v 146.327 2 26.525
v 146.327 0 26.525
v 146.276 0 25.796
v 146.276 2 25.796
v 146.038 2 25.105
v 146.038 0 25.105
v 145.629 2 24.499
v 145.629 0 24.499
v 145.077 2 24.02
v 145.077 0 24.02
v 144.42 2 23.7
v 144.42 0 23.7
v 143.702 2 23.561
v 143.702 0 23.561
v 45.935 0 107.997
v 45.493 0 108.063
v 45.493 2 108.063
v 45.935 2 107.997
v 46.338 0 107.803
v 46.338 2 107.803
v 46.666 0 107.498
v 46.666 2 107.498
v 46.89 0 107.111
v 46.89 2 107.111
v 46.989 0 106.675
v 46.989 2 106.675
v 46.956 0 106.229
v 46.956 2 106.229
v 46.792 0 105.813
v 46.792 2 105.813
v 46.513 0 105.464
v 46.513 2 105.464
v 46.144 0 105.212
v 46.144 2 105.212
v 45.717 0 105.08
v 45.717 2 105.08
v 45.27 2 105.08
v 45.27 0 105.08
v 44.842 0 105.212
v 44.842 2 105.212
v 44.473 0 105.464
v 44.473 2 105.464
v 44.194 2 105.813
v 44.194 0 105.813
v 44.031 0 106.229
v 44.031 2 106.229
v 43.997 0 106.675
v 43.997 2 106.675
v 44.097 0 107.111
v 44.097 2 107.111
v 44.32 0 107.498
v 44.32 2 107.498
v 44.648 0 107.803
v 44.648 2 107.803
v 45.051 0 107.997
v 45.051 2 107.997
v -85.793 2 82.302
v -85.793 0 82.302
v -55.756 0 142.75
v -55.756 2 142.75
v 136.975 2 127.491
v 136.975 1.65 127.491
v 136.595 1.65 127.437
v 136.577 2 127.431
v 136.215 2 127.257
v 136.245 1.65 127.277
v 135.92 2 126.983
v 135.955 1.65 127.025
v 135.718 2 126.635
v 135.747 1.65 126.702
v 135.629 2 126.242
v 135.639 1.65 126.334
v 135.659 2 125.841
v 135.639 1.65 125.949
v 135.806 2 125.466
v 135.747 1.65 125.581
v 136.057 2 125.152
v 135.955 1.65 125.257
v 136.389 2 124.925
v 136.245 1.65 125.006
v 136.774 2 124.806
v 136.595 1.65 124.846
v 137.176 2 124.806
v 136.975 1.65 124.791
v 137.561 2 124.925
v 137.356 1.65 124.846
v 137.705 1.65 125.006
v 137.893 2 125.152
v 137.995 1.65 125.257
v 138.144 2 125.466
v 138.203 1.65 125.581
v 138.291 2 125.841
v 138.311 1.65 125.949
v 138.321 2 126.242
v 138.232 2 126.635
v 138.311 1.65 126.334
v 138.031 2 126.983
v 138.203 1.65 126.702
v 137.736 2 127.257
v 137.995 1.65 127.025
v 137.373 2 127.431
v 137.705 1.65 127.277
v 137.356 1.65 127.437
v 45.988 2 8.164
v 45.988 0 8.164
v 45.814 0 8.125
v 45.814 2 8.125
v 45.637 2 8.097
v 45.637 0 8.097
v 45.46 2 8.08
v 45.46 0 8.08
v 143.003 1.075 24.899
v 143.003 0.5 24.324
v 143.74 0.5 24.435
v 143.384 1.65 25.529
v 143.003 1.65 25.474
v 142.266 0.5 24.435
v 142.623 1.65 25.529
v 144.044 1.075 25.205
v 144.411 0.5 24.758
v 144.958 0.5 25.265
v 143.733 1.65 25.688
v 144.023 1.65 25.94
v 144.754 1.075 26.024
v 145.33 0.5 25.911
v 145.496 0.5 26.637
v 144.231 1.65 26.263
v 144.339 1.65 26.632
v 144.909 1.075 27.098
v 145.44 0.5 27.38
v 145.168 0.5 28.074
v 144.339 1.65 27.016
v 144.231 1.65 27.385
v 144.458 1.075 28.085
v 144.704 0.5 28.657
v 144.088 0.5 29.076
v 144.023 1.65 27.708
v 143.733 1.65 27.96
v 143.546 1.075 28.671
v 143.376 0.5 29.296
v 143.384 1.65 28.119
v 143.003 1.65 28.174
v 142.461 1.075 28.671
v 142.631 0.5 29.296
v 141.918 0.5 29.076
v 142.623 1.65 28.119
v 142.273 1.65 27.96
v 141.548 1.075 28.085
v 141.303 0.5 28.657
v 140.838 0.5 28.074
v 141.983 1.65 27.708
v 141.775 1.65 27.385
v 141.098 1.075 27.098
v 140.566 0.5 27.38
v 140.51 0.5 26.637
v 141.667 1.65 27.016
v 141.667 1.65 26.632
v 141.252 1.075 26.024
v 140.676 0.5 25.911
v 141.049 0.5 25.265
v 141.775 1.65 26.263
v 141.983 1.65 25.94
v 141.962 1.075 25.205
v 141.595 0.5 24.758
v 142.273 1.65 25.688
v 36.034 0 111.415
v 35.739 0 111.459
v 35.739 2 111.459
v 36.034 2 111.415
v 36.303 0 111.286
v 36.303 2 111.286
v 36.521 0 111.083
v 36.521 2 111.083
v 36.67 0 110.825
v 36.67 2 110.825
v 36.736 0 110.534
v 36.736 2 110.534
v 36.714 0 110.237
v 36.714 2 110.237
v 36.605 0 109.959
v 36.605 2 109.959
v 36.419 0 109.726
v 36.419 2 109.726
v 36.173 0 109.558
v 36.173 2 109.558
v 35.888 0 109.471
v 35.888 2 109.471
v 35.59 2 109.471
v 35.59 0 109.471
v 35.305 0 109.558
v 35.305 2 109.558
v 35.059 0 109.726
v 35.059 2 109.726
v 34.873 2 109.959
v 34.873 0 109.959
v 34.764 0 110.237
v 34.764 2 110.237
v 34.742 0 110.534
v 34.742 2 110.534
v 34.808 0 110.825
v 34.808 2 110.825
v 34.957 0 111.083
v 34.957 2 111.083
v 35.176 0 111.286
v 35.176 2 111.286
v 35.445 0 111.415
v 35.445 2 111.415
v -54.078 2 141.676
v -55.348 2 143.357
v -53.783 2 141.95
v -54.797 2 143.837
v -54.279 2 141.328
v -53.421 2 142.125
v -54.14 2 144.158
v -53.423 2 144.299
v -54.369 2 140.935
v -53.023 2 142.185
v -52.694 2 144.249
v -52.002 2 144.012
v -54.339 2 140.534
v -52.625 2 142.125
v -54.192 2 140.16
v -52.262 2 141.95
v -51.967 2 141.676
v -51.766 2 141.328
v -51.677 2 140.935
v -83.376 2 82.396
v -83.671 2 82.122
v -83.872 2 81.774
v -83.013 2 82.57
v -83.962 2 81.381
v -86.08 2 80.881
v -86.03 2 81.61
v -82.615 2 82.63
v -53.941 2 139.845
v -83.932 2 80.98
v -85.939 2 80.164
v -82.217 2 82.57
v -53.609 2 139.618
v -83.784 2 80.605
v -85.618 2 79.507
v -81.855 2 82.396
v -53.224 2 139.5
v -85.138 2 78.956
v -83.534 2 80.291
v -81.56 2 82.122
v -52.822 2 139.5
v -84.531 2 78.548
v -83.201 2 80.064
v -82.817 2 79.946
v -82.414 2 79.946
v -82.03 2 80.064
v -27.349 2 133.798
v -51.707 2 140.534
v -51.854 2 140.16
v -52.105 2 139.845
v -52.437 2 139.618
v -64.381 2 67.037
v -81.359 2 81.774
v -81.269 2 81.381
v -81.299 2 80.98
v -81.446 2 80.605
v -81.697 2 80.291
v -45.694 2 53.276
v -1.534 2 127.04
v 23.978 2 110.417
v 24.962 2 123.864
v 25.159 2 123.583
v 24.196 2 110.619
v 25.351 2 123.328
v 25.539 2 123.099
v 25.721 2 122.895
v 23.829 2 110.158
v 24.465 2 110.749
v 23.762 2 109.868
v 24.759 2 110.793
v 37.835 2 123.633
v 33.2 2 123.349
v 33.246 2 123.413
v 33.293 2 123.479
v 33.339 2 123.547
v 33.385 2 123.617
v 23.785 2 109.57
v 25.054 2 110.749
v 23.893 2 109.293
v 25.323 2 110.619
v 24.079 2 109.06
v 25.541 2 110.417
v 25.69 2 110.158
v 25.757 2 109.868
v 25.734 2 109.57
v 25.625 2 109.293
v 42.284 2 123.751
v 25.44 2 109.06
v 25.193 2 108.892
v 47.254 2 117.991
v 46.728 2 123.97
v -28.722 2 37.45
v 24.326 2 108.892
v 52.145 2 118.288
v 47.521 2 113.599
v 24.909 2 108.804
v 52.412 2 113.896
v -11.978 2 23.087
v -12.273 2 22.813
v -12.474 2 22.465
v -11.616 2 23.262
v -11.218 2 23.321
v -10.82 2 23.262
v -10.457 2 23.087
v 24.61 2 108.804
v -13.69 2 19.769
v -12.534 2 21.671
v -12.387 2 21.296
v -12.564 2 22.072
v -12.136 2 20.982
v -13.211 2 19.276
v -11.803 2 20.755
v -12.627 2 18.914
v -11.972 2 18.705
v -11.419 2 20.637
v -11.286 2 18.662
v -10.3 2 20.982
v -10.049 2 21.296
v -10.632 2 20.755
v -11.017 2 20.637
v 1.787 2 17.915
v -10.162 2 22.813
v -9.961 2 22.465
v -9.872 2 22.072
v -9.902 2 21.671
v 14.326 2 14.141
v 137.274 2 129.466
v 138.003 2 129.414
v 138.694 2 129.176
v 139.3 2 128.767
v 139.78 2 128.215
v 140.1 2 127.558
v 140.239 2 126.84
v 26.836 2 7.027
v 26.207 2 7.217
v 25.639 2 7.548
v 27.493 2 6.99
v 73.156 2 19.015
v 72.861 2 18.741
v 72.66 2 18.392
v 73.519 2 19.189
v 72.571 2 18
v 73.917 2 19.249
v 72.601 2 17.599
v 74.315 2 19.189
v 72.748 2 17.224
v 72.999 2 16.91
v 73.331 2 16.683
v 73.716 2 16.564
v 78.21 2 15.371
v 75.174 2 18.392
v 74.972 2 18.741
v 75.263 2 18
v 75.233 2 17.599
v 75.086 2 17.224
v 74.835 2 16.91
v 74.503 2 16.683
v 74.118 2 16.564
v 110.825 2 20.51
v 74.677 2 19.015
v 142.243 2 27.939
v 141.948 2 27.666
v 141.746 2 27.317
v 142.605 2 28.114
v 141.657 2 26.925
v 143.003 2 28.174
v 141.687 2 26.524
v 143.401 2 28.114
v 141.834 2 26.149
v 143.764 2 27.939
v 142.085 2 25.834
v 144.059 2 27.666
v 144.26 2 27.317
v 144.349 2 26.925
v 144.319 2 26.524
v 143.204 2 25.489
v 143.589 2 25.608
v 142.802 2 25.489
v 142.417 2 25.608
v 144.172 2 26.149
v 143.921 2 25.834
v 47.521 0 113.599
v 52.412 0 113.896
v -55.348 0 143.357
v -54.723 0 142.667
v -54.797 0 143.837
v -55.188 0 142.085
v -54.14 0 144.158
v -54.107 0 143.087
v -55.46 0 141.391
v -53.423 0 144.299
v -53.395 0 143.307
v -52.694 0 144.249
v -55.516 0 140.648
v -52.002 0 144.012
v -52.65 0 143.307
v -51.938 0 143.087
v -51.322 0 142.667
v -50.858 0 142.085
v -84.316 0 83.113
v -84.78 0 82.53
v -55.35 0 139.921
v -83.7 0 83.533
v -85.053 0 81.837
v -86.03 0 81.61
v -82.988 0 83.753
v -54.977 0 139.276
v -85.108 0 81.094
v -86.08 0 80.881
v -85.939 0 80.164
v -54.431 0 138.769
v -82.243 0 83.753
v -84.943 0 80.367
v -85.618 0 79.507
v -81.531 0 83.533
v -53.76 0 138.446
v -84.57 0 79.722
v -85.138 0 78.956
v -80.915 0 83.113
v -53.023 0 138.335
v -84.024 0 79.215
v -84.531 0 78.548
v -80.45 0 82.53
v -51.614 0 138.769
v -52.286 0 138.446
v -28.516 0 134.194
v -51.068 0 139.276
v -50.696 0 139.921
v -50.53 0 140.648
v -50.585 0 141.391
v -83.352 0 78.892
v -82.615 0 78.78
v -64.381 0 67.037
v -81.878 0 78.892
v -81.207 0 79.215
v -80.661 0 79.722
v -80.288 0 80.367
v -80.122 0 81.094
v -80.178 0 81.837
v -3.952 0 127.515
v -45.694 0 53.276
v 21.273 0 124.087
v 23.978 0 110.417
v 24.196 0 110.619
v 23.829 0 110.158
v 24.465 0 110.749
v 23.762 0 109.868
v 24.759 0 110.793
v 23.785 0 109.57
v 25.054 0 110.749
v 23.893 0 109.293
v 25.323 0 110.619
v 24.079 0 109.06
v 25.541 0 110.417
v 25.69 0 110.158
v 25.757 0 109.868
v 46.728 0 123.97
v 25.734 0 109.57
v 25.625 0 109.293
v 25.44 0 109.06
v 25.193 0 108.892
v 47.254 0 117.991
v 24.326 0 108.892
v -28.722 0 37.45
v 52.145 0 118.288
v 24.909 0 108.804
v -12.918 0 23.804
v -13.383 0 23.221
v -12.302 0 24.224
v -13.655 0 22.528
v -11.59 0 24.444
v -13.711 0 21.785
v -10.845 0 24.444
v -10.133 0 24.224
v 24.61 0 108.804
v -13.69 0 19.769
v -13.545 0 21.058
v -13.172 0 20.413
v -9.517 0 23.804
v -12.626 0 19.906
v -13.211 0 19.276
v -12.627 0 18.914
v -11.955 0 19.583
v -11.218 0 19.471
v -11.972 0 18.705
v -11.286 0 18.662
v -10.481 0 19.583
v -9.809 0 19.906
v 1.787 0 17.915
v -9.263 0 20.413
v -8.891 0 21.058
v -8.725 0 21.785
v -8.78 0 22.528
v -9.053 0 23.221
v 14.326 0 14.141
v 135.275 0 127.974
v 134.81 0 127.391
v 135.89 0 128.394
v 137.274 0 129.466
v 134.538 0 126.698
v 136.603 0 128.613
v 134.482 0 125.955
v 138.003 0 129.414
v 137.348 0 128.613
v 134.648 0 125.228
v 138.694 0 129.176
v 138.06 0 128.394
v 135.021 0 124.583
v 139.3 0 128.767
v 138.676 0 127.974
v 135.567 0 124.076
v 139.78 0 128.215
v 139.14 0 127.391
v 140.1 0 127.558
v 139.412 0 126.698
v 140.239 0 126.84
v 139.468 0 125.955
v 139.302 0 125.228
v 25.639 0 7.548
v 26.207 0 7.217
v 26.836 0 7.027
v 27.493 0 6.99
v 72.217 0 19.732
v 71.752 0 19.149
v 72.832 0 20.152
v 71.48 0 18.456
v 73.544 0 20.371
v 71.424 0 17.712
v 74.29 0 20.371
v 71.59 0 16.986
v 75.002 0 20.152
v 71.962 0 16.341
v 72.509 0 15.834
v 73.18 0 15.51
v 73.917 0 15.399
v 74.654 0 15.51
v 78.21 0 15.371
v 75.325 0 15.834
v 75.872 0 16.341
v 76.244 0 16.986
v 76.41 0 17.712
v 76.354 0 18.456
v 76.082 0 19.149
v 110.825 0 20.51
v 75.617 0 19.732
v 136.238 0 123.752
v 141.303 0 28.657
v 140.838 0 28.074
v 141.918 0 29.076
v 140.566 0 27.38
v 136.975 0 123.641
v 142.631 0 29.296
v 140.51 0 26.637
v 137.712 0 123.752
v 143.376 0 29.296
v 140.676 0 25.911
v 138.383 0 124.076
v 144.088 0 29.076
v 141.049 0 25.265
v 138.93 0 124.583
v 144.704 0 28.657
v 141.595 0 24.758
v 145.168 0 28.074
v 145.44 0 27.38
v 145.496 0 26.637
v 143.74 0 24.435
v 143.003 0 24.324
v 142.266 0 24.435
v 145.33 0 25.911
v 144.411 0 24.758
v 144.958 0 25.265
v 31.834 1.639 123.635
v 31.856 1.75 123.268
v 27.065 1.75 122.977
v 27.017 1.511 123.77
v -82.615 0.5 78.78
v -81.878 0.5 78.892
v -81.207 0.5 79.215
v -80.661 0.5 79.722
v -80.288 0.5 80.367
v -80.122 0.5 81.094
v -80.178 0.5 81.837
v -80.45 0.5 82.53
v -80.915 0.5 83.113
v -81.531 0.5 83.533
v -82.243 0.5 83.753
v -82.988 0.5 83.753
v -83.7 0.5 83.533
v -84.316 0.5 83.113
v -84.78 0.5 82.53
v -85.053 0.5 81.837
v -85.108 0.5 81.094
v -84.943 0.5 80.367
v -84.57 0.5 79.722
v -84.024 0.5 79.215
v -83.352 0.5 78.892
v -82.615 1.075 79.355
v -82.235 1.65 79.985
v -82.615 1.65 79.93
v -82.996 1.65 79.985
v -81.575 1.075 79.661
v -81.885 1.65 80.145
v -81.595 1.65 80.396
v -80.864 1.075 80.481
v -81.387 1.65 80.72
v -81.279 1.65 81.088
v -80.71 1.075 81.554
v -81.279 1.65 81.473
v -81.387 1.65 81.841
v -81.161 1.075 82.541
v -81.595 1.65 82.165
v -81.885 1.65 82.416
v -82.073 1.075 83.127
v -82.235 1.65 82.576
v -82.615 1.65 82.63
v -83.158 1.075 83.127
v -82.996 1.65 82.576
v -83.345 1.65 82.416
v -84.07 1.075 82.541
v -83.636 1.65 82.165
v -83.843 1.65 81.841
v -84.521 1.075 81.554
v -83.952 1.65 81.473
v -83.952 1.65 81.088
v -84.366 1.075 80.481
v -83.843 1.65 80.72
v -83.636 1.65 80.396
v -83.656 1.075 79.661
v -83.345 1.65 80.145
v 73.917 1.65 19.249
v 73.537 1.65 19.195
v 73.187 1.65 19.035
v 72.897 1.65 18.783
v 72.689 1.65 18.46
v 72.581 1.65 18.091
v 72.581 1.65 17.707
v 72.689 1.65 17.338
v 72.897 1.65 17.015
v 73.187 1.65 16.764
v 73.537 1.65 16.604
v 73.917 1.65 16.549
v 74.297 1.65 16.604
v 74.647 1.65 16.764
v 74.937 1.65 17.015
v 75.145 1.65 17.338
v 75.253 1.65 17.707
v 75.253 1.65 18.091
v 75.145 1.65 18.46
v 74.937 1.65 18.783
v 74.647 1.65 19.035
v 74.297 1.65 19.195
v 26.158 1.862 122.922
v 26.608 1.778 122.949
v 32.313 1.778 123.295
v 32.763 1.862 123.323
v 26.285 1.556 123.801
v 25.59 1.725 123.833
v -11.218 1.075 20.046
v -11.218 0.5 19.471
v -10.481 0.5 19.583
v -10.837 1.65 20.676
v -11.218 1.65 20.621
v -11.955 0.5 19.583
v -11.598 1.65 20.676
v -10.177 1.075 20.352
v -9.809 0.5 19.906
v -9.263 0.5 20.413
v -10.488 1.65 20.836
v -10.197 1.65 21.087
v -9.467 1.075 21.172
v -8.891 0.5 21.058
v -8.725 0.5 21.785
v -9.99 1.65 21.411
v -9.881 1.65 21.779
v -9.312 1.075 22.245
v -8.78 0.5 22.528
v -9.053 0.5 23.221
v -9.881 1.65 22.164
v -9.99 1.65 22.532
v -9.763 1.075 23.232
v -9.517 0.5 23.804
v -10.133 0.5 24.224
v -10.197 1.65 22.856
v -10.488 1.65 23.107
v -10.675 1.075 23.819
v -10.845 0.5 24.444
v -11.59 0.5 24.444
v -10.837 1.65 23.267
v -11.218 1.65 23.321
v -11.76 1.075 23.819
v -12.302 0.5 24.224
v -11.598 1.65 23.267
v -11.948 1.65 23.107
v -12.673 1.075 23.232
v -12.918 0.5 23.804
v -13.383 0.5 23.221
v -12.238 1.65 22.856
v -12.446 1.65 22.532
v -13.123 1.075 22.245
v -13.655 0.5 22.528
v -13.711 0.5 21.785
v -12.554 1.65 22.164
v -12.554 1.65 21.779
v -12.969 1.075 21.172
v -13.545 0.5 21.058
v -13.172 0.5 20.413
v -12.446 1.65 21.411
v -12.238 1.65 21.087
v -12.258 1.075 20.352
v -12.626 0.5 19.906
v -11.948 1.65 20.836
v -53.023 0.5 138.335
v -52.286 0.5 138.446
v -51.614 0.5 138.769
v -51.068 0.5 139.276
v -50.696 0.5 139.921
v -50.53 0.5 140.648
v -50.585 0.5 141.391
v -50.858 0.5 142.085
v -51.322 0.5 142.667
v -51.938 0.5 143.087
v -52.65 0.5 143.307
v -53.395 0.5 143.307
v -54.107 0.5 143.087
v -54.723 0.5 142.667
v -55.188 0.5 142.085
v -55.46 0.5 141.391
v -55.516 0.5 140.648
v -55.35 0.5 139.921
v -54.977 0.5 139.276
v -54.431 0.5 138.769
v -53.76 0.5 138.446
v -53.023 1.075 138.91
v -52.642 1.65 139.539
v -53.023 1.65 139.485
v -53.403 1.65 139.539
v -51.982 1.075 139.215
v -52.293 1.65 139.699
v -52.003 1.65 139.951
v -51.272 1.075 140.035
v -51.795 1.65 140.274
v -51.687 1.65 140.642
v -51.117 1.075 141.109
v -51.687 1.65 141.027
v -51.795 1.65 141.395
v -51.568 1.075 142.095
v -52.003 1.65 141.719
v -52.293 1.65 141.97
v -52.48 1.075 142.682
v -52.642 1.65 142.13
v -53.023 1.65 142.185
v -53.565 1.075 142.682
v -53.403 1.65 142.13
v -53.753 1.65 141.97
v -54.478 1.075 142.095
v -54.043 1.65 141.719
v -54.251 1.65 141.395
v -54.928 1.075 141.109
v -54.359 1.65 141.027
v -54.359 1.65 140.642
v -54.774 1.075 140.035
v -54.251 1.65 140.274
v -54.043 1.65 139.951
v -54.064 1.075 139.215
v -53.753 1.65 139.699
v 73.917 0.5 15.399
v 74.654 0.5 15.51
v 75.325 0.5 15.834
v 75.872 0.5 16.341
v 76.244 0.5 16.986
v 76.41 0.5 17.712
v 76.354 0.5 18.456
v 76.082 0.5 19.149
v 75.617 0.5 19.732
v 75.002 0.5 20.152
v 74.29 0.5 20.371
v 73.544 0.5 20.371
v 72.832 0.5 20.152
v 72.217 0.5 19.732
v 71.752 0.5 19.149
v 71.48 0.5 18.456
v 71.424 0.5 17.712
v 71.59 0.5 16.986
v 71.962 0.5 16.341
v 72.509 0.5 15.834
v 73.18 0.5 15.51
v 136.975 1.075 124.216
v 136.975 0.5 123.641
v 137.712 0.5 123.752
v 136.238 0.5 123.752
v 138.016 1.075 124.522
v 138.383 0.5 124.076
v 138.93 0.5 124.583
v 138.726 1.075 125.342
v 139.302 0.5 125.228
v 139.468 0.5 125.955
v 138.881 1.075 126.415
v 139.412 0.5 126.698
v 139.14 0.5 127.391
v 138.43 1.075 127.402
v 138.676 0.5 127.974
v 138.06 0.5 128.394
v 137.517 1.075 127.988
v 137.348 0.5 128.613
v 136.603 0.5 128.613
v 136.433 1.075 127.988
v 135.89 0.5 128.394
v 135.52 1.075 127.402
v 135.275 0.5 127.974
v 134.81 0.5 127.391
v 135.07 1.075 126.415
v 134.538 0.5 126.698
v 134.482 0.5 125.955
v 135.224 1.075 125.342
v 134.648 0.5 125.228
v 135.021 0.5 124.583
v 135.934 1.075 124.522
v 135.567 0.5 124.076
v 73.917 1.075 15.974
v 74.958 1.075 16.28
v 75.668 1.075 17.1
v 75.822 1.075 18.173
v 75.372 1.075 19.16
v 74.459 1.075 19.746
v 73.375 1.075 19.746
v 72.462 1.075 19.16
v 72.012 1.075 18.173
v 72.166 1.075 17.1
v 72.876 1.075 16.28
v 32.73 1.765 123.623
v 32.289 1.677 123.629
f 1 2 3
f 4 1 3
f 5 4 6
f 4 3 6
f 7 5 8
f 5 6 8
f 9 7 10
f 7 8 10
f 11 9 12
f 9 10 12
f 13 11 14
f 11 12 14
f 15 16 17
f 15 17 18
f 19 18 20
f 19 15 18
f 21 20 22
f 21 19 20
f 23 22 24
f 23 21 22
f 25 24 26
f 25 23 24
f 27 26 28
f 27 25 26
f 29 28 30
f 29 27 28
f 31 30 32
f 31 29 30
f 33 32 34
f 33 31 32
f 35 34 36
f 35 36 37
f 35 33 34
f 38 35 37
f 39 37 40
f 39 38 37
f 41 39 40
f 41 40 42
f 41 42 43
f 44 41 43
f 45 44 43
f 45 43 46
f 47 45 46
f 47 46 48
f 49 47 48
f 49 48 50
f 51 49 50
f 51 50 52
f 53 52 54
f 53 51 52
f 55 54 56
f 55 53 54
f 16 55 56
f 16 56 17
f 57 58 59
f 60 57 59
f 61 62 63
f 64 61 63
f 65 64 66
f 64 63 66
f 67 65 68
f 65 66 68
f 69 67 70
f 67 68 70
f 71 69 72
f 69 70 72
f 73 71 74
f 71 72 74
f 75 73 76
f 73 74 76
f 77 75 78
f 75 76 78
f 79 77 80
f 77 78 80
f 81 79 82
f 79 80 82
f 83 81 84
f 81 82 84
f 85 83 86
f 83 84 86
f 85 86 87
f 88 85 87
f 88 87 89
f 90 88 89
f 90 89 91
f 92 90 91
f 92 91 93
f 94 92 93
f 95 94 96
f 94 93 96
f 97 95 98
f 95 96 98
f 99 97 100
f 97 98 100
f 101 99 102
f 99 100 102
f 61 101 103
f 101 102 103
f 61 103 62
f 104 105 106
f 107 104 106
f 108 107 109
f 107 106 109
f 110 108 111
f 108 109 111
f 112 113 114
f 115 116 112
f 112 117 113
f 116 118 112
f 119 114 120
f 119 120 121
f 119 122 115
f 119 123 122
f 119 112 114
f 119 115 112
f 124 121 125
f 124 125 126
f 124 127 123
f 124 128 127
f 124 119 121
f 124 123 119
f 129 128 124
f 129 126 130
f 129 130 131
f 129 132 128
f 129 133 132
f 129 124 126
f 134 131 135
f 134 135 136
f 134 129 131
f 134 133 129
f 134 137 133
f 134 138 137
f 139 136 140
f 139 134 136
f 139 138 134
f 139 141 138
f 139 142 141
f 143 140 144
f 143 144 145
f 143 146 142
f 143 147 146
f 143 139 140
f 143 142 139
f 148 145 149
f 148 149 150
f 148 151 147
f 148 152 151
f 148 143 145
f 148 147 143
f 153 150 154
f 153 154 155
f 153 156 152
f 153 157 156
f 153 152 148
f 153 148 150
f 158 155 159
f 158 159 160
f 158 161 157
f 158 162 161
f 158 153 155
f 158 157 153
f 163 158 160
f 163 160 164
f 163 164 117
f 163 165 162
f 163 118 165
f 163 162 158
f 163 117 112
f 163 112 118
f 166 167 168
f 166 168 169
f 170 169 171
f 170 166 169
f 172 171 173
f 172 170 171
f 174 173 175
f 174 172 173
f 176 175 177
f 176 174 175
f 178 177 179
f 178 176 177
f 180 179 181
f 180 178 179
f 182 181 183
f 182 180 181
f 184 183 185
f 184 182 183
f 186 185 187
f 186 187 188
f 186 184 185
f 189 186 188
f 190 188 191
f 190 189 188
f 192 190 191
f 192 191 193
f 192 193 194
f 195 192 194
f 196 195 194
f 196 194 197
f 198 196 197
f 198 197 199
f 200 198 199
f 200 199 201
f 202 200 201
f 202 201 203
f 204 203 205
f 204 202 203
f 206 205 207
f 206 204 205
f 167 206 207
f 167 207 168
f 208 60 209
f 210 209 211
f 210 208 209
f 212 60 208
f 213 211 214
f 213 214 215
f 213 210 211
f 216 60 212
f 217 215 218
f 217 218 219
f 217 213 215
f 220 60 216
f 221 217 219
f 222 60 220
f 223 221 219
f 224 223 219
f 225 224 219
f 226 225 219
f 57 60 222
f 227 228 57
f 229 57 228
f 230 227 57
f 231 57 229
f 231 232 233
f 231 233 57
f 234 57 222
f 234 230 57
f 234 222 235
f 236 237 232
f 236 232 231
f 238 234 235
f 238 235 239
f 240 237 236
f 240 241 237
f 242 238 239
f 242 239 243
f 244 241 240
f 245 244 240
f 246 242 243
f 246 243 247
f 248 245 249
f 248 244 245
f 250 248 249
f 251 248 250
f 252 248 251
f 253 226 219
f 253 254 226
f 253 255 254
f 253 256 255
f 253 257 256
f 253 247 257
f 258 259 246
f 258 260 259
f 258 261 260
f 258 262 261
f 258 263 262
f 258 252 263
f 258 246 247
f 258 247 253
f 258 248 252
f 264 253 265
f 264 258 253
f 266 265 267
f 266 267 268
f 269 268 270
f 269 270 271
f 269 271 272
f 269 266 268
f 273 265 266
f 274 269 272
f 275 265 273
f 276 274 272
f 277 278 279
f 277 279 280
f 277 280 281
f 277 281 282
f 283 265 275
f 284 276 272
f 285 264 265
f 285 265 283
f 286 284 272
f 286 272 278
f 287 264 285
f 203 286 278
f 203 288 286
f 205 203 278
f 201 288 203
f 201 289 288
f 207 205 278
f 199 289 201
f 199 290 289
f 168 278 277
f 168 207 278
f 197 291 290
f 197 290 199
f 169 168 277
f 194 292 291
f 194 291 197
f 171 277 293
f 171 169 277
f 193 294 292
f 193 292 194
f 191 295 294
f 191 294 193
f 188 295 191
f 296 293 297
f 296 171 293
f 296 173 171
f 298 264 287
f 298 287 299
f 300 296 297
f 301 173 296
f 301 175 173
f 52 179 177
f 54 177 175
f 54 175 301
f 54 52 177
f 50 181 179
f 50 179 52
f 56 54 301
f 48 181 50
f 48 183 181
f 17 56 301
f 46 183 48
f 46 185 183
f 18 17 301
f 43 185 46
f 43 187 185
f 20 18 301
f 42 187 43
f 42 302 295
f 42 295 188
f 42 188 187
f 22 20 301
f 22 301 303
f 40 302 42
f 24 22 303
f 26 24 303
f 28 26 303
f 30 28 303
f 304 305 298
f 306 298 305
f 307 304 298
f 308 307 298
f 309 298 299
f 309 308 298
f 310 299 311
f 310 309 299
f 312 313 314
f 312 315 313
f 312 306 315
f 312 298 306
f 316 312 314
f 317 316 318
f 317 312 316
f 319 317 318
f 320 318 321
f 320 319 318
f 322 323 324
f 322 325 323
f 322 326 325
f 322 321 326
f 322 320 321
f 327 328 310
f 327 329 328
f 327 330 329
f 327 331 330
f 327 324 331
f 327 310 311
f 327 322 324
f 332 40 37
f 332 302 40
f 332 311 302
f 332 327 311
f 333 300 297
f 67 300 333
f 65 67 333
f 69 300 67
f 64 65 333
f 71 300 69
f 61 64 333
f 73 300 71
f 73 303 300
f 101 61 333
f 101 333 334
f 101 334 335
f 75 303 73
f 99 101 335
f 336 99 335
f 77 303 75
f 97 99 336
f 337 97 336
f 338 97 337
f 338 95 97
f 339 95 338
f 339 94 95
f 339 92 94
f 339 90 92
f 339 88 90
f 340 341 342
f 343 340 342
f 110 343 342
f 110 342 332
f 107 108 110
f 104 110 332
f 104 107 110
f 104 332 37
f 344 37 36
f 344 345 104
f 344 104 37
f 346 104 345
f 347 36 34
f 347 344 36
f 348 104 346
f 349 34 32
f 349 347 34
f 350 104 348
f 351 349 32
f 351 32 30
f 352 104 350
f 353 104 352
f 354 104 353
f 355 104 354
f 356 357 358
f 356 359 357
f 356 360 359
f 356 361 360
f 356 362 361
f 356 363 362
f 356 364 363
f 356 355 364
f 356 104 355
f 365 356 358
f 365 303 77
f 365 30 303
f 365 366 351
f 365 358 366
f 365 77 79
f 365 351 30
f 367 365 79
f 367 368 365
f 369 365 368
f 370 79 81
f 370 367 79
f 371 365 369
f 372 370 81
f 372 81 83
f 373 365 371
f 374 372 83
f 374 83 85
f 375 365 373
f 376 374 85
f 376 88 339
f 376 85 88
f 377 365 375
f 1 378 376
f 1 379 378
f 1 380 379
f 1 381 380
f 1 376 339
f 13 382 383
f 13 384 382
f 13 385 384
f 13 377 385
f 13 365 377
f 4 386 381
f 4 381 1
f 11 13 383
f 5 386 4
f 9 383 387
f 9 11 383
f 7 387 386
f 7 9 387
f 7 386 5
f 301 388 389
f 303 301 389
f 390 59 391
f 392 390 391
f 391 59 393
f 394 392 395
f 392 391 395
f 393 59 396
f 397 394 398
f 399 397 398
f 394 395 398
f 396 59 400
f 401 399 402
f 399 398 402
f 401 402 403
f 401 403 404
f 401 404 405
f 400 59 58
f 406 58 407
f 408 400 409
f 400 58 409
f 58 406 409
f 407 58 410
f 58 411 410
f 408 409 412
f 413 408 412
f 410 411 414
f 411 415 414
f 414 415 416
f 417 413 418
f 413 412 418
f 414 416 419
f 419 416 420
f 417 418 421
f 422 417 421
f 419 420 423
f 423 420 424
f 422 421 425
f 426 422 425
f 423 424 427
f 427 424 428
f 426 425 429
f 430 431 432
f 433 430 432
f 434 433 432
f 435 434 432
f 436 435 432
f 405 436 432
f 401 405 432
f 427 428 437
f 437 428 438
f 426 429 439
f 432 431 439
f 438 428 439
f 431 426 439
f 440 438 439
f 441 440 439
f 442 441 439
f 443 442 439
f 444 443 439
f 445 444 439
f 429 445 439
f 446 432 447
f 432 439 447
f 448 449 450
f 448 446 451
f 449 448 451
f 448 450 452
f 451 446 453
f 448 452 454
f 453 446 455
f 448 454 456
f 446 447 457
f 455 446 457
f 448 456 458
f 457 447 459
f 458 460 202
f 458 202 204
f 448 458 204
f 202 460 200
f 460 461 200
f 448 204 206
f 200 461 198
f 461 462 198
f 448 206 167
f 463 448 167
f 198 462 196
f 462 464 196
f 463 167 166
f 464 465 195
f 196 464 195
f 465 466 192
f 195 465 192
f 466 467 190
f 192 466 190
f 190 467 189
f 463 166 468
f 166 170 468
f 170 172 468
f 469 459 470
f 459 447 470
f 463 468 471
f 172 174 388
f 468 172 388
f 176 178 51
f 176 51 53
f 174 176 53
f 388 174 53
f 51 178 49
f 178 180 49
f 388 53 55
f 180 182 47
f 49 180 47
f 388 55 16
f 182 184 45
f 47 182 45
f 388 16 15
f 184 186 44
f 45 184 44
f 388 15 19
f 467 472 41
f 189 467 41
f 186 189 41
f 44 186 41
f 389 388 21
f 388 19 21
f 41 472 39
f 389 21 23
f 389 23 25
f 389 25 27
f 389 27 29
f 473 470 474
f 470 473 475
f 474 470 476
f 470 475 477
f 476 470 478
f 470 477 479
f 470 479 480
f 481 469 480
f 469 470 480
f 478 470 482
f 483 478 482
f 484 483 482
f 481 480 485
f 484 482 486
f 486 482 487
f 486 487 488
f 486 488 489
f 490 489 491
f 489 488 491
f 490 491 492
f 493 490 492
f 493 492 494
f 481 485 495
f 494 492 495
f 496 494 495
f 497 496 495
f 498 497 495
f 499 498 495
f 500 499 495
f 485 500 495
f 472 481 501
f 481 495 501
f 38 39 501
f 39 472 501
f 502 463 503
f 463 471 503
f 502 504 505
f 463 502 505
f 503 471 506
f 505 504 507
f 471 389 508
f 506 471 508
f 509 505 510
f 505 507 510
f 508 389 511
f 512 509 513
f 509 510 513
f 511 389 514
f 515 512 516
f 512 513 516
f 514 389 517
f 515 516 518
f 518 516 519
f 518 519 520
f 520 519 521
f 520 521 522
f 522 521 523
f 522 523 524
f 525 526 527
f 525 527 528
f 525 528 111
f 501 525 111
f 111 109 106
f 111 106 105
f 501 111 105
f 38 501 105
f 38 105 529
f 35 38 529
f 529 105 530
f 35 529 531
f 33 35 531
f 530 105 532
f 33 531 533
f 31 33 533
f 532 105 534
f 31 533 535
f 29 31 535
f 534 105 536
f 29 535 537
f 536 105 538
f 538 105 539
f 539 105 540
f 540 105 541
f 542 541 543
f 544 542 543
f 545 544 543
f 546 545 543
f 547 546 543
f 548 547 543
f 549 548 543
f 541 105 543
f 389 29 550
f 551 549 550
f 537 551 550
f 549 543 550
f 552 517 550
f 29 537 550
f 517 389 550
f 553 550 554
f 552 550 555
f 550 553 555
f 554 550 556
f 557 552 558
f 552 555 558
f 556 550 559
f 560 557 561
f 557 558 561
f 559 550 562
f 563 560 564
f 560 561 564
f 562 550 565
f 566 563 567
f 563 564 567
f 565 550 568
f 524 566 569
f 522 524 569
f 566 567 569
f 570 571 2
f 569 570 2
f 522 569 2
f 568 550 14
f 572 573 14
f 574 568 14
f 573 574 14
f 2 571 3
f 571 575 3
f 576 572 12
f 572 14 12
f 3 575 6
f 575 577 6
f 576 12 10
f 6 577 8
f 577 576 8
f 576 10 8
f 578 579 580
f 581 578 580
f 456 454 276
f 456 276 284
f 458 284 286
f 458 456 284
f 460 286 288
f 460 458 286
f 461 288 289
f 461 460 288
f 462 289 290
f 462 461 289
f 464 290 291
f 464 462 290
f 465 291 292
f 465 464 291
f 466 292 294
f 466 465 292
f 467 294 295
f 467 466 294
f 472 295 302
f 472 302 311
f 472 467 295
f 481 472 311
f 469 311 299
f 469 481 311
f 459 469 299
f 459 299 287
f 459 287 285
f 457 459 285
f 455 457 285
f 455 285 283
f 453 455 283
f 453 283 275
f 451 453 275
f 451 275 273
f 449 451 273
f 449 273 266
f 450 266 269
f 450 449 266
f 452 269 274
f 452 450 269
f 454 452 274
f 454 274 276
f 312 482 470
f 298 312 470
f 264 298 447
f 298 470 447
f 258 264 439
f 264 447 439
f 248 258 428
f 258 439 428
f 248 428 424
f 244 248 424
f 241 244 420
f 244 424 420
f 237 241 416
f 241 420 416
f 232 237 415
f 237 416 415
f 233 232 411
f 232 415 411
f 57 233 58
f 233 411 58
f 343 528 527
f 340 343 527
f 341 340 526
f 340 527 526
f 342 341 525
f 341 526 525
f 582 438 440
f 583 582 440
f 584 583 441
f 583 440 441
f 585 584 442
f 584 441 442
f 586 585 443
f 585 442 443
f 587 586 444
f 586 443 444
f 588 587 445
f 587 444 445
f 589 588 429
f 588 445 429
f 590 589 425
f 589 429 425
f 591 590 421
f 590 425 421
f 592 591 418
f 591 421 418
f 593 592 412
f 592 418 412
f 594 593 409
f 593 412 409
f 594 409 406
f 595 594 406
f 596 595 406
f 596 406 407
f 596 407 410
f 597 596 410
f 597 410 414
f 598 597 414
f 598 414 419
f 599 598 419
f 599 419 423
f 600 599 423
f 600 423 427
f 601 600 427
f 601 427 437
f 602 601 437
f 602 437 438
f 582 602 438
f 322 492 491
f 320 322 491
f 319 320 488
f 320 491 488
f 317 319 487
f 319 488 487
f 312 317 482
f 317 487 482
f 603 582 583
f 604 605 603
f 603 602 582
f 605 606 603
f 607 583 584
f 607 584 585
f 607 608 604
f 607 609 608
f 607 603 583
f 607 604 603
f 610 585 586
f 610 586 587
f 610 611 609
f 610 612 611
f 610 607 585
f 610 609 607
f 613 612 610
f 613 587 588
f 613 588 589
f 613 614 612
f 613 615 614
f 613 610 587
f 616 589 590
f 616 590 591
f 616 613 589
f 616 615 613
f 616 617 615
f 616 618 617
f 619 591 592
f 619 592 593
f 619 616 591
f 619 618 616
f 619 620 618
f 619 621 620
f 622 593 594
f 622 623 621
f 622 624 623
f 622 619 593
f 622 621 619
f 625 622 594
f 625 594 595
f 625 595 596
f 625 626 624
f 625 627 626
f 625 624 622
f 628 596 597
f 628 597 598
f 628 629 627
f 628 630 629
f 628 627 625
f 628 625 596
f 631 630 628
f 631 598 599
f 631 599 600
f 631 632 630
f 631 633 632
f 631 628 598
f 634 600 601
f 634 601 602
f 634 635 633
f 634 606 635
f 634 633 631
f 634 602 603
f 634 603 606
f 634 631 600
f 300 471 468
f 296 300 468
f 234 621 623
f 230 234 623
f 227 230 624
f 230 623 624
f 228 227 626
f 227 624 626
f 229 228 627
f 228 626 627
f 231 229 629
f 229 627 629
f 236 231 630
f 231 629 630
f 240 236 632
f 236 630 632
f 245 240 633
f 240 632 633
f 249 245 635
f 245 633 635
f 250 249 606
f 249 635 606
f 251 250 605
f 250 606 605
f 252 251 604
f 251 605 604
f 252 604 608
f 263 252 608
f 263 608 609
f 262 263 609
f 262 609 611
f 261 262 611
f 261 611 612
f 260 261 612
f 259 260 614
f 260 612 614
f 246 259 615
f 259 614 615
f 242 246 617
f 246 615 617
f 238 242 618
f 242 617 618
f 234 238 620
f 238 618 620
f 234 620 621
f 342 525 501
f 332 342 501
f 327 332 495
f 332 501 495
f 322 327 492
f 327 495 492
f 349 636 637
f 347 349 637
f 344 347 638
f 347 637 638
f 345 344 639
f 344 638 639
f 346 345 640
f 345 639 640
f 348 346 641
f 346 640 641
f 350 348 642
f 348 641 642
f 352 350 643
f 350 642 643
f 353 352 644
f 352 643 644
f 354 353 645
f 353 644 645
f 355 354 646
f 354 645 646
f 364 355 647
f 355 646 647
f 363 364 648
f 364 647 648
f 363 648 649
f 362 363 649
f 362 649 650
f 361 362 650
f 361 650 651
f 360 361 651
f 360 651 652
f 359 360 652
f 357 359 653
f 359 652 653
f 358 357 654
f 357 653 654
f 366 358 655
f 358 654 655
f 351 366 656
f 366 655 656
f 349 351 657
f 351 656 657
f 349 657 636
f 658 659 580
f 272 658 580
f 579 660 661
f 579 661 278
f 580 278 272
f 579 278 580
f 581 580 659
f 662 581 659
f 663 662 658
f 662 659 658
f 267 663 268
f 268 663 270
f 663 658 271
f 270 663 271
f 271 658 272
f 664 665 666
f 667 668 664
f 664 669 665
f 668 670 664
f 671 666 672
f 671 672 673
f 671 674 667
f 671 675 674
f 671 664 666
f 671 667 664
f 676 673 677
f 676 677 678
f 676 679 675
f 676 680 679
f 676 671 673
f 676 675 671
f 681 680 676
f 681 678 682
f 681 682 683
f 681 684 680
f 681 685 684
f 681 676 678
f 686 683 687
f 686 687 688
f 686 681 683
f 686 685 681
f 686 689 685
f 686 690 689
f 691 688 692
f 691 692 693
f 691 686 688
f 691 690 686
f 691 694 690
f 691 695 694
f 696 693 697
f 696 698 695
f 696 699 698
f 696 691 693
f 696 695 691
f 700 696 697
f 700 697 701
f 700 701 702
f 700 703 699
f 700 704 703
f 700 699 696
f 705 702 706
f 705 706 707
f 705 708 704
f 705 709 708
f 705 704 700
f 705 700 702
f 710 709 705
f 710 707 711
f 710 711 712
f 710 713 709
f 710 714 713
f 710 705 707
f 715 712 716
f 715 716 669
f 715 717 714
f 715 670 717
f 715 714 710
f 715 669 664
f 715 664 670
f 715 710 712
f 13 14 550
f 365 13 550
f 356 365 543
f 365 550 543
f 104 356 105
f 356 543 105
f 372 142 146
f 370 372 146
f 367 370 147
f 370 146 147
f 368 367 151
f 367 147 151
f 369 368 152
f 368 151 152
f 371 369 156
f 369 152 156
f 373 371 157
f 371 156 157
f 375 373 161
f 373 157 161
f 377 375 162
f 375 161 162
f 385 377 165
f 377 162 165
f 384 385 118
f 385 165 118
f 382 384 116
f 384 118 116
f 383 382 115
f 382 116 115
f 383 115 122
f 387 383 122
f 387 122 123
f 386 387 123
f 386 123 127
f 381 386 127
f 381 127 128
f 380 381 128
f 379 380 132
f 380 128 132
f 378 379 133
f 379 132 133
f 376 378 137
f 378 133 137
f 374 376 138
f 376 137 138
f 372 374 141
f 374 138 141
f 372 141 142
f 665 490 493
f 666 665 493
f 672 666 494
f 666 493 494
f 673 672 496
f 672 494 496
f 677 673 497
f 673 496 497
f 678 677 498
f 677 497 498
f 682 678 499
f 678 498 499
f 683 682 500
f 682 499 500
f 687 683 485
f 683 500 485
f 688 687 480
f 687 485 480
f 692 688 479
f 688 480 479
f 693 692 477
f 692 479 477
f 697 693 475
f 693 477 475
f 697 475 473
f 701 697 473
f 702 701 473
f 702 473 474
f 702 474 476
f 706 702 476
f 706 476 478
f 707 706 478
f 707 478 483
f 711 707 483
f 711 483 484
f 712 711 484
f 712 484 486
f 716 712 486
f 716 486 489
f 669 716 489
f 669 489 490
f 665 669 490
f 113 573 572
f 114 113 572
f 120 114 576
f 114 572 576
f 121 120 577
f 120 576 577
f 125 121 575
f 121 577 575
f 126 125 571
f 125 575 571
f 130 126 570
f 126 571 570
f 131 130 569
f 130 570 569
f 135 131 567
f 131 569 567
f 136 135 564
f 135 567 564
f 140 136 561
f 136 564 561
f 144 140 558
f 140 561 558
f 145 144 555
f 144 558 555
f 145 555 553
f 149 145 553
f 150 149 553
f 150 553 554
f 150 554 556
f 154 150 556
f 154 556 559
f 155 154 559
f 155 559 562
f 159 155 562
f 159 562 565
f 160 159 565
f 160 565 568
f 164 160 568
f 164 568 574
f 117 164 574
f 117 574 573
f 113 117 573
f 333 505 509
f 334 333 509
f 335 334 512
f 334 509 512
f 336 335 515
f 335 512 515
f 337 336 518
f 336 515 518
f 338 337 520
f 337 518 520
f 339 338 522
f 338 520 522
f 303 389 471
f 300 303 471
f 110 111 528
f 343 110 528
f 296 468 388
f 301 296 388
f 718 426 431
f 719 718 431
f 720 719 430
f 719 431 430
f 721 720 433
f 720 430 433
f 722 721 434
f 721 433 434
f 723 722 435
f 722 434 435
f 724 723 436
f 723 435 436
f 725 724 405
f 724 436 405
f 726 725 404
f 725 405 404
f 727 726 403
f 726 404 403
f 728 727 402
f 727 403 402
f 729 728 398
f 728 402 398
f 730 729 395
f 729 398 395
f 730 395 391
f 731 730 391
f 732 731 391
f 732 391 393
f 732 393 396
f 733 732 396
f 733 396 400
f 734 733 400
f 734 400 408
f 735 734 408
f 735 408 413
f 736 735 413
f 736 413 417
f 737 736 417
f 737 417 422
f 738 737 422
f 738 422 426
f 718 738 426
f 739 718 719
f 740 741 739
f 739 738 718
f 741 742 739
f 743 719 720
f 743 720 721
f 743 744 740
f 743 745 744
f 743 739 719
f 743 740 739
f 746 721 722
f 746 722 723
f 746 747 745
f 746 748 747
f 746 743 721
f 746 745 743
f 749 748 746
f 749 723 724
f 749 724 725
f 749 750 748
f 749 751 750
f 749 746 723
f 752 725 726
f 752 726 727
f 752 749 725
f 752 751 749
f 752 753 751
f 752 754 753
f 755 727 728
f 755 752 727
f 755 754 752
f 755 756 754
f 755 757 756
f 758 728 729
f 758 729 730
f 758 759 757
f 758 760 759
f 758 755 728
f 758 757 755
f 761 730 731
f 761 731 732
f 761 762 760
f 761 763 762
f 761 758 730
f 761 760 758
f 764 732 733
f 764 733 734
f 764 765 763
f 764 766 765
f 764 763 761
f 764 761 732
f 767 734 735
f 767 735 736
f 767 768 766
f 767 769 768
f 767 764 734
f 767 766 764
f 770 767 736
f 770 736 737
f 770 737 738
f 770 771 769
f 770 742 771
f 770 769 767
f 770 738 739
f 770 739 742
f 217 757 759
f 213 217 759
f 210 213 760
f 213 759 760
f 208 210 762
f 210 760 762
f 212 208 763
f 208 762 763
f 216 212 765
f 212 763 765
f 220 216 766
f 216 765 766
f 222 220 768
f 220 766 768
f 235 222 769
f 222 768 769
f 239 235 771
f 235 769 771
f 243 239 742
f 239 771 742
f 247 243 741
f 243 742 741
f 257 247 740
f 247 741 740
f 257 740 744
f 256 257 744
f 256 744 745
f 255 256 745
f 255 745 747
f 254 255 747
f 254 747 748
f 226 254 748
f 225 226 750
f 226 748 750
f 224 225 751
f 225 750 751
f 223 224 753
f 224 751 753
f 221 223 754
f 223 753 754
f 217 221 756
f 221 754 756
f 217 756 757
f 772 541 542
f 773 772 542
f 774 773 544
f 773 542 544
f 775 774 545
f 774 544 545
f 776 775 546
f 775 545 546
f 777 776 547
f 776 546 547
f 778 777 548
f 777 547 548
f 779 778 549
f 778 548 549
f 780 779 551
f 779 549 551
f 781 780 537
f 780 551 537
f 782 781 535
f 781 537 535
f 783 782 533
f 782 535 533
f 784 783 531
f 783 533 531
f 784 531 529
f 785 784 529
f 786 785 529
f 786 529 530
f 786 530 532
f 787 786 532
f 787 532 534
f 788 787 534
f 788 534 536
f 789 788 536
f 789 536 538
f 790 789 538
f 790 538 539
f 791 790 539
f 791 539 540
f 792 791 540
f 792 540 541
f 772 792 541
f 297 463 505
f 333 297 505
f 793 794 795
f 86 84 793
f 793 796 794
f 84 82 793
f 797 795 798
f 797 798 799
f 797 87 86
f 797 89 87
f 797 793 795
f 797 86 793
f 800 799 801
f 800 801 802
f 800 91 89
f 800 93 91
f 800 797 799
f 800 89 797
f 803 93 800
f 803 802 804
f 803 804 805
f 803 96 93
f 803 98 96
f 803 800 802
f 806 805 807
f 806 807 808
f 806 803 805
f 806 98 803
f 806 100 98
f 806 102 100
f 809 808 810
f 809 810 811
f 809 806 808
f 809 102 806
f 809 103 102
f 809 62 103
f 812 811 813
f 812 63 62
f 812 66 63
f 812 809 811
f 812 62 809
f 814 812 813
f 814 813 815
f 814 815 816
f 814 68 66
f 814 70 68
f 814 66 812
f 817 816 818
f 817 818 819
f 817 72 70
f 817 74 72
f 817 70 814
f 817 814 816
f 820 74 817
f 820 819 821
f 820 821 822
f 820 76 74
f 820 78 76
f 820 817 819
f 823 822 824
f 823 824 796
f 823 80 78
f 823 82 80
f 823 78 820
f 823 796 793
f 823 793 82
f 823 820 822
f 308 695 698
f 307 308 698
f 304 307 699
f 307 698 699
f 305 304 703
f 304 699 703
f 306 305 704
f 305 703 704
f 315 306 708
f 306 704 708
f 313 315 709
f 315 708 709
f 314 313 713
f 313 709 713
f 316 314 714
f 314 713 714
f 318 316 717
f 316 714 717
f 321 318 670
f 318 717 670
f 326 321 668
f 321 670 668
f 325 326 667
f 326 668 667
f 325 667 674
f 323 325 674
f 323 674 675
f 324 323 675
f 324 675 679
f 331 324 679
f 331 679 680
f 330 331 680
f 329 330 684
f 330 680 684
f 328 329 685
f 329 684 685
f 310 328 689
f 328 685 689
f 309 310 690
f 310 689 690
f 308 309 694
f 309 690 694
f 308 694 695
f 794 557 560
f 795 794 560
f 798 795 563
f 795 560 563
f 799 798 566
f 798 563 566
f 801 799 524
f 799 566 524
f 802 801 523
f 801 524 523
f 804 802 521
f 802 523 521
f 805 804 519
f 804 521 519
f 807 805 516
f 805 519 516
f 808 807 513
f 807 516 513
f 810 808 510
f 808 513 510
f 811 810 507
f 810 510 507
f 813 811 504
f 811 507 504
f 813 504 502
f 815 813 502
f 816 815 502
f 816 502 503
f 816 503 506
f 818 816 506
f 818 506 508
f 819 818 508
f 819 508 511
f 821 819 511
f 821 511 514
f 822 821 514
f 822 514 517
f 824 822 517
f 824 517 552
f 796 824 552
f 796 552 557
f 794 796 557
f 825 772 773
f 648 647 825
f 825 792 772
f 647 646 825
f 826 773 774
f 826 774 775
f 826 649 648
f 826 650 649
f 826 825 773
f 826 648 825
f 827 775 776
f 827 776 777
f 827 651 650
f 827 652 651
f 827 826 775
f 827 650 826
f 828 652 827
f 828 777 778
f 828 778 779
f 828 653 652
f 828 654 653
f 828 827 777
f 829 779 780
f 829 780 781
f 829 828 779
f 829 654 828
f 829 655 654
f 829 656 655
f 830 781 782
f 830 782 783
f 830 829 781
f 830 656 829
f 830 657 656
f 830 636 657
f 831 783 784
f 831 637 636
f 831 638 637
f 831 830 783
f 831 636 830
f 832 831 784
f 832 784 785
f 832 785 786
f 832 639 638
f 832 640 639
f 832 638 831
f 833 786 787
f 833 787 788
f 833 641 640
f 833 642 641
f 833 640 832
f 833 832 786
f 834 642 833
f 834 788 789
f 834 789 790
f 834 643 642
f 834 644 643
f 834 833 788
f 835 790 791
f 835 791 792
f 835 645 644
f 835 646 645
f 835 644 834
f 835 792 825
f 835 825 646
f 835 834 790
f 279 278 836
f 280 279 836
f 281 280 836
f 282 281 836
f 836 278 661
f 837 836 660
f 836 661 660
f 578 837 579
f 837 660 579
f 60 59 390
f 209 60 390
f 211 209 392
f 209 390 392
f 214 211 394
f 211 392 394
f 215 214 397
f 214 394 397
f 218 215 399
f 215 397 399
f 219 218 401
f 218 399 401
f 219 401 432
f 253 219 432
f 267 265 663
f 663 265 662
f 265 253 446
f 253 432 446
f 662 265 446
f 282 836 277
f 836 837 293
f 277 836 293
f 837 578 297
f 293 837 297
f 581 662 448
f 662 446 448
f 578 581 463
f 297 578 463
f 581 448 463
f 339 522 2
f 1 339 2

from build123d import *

# Parameters (mm, degrees)
SKETCH1_R                = 1
SKETCH1_R_2              = 1.5
SKETCH1_R_3              = 1.35
MAIN_PLATE_DEPTH         = 2
SKETCH2_R                = 2.5
SCREW_HOLES_DEPTH        = 1.7
SCREW_HOLES_CHAMFER_SIZE = 1.2


with BuildPart() as part:
    # Sketch1 → Main_plate (new body)
    with BuildSketch(Plane(origin=(0, 0, 0), x_dir=(1, 0, 0), z_dir=(0, 1, 0))):
        with BuildLine():
            Line((-85.7928409, -82.301697444), (-55.755812757, -142.75024532))
            ThreePointArc((-55.755812757, -142.75024532), (-54.140343173, -144.158373046), (-52.002337011, -144.011760212))
            ThreePointArc((-52.002337011, -144.011760212), (-3.951682628, -127.514559525), (46.728283967, -123.969985789))
            Line((46.728283967, -123.969985789), (137.274321343, -129.465618584))
            ThreePointArc((137.274321343, -129.465618584), (139.300267663, -128.766971907), (140.238810242, -126.840393723))
            Line((140.238810242, -126.840393723), (146.327388064, -26.524995005))
            ThreePointArc((146.327388064, -26.524995005), (145.628741387, -24.499048684), (143.702163203, -23.560506106))
            ThreePointArc((143.702163203, -23.560506106), (94.476527457, -18.20079206), (45.987943487, -8.163512858))
            ThreePointArc((45.987943487, -8.163512858), (45.725737799, -8.109235511), (45.459546448, -8.080252452))
            Line((45.459546448, -8.080252452), (27.492609364, -6.989760902))
            ThreePointArc((27.492609364, -6.989760902), (26.515953382, -7.103440368), (25.638814565, -7.547745919))
            ThreePointArc((25.638814565, -7.547745919), (8.167641381, -16.397587105), (-11.285751241, -18.661896472))
            ThreePointArc((-11.285751241, -18.661896472), (-12.626973233, -18.913649552), (-13.689904343, -19.76947284))
            ThreePointArc((-13.689904343, -19.76947284), (-45.694454746, -53.276077835), (-84.531326007, -78.548221698))
            ThreePointArc((-84.531326007, -78.548221698), (-85.939453733, -80.163691282), (-85.7928409, -82.301697444))
        make_face()
        with Locations(Location((24.759473712, -109.793011675, 0), (0, 0, 270))):
            Circle(SKETCH1_R, mode=Mode.SUBTRACT)
        with Locations(Location((35.739268597, -110.459423178, 0), (0, 0, 270))):
            Circle(SKETCH1_R, mode=Mode.SUBTRACT)
        with Locations(Location((45.493229955, -106.563189377, 0), (0, 0, 270))):
            Circle(SKETCH1_R_2, mode=Mode.SUBTRACT)
        with Locations(Location((143.003172699, -26.823913699, 0), (0, 0, 270))):
            Circle(SKETCH1_R_3, mode=Mode.SUBTRACT)
        with Locations(Location((73.916954773, -17.899251104, 0), (0, 0, 270))):
            Circle(SKETCH1_R_3, mode=Mode.SUBTRACT)
        with Locations(Location((-11.217743895, -21.971485999, 0), (0, 0, 270))):
            Circle(SKETCH1_R_3, mode=Mode.SUBTRACT)
        with Locations(Location((-82.615354782, -81.280438678, 0), (0, 0, 270))):
            Circle(SKETCH1_R_3, mode=Mode.SUBTRACT)
        with Locations(Location((-53.022766816, -140.834565069, 0), (0, 0, 270))):
            Circle(SKETCH1_R_3, mode=Mode.SUBTRACT)
        with Locations(Location((136.975163208, -126.141388687, 0), (0, 0, 270))):
            Circle(SKETCH1_R_3, mode=Mode.SUBTRACT)
        Polygon((47.520707964, -113.598943276), (52.411707503, -113.895799309), (52.145142902, -118.287717263), (47.254143363, -117.99086123), align=None, mode=Mode.SUBTRACT)
    extrude(amount=MAIN_PLATE_DEPTH)

    # Sketch2 → Screw_holes (cut)
    with BuildSketch(Plane.XZ):
        with Locations(Location((136.975163208, 126.141388687, 0), (0, 0, 270))):
            Circle(SKETCH2_R)
        with Locations(Location((-53.022766816, 140.834565069, 0), (0, 0, 270))):
            Circle(SKETCH2_R)
        with Locations(Location((-82.615354782, 81.280438678, 0), (0, 0, 270))):
            Circle(SKETCH2_R)
        with Locations(Location((-11.217743895, 21.971485999, 0), (0, 0, 270))):
            Circle(SKETCH2_R)
        with Locations(Location((73.916954773, 17.899251104, 0), (0, 0, 270))):
            Circle(SKETCH2_R)
        with Locations(Location((143.003172699, 26.823913699, 0), (0, 0, 270))):
            Circle(SKETCH2_R)
    extrude(amount=-SCREW_HOLES_DEPTH, mode=Mode.SUBTRACT)

    # Screw_holes_chamfer
    # the kernel refuses this chamfer: 1.2 mm, written as the material it adds along each edge
    with BuildSketch(Plane(origin=(143.003172699, 1.7, 26.823913699), x_dir=(0, 0, -1), z_dir=(-1, 0, 0))) as screw_holes_chamfer_piece_1_section:
        Polygon((2.5, SCREW_HOLES_CHAMFER_SIZE), (2.5 - SCREW_HOLES_CHAMFER_SIZE, 0), (2.5, 0), align=None)
    screw_holes_chamfer_piece_1 = revolve(axis=Axis((143.003172699, 1.7, 26.823913699), (0, -1, 0)), mode=Mode.PRIVATE)
    screw_holes_chamfer_piece_1 = screw_holes_chamfer_piece_1 - Plane(origin=(143.003172699, 1.073479929, 26.823913699), x_dir=(0, 0, 1), z_dir=(0, -1, 0)) * Cylinder(1.35, 10, mode=Mode.PRIVATE)
    add(screw_holes_chamfer_piece_1)
    with BuildSketch(Plane(origin=(73.916954773, 1.7, 17.899251104), x_dir=(0, 0, -1), z_dir=(-1, 0, 0))) as screw_holes_chamfer_piece_2_section:
        Polygon((2.5, SCREW_HOLES_CHAMFER_SIZE), (2.5 - SCREW_HOLES_CHAMFER_SIZE, 0), (2.5, 0), align=None)
    screw_holes_chamfer_piece_2 = revolve(axis=Axis((73.916954773, 1.7, 17.899251104), (0, -1, 0)), mode=Mode.PRIVATE)
    screw_holes_chamfer_piece_2 = screw_holes_chamfer_piece_2 - Plane(origin=(73.916954773, 1.073479929, 17.899251104), x_dir=(0, 0, 1), z_dir=(0, -1, 0)) * Cylinder(1.35, 10, mode=Mode.PRIVATE)
    add(screw_holes_chamfer_piece_2)
    with BuildSketch(Plane(origin=(-11.217743895, 1.7, 21.971485999), x_dir=(0, 0, -1), z_dir=(-1, 0, 0))) as screw_holes_chamfer_piece_3_section:
        Polygon((2.5, SCREW_HOLES_CHAMFER_SIZE), (2.5 - SCREW_HOLES_CHAMFER_SIZE, 0), (2.5, 0), align=None)
    screw_holes_chamfer_piece_3 = revolve(axis=Axis((-11.217743895, 1.7, 21.971485999), (0, -1, 0)), mode=Mode.PRIVATE)
    screw_holes_chamfer_piece_3 = screw_holes_chamfer_piece_3 - Plane(origin=(-11.217743895, 1.073479929, 21.971485999), x_dir=(0, 0, 1), z_dir=(0, -1, 0)) * Cylinder(1.35, 10, mode=Mode.PRIVATE)
    add(screw_holes_chamfer_piece_3)
    with BuildSketch(Plane(origin=(-82.615354782, 1.7, 81.280438678), x_dir=(0, 0, -1), z_dir=(-1, 0, 0))) as screw_holes_chamfer_piece_4_section:
        Polygon((2.5, SCREW_HOLES_CHAMFER_SIZE), (2.5 - SCREW_HOLES_CHAMFER_SIZE, 0), (2.5, 0), align=None)
    screw_holes_chamfer_piece_4 = revolve(axis=Axis((-82.615354782, 1.7, 81.280438678), (0, -1, 0)), mode=Mode.PRIVATE)
    screw_holes_chamfer_piece_4 = screw_holes_chamfer_piece_4 - Plane(origin=(-82.615354782, 1.073479929, 81.280438678), x_dir=(0, 0, 1), z_dir=(0, -1, 0)) * Cylinder(1.35, 11, mode=Mode.PRIVATE)
    add(screw_holes_chamfer_piece_4)
    with BuildSketch(Plane(origin=(-53.022766816, 1.7, 140.834565069), x_dir=(0, 0, -1), z_dir=(-1, 0, 0))) as screw_holes_chamfer_piece_5_section:
        Polygon((2.5, SCREW_HOLES_CHAMFER_SIZE), (2.5 - SCREW_HOLES_CHAMFER_SIZE, 0), (2.5, 0), align=None)
    screw_holes_chamfer_piece_5 = revolve(axis=Axis((-53.022766816, 1.7, 140.834565069), (0, -1, 0)), mode=Mode.PRIVATE)
    screw_holes_chamfer_piece_5 = screw_holes_chamfer_piece_5 - Plane(origin=(-53.022766816, 1.073479929, 140.834565069), x_dir=(0, 0, 1), z_dir=(0, -1, 0)) * Cylinder(1.35, 10, mode=Mode.PRIVATE)
    add(screw_holes_chamfer_piece_5)
    with BuildSketch(Plane(origin=(136.975163208, 1.7, 126.141388687), x_dir=(0, 0, -1), z_dir=(-1, 0, 0))) as screw_holes_chamfer_piece_6_section:
        Polygon((2.5, SCREW_HOLES_CHAMFER_SIZE), (2.5 - SCREW_HOLES_CHAMFER_SIZE, 0), (2.5, 0), align=None)
    screw_holes_chamfer_piece_6 = revolve(axis=Axis((136.975163208, 1.7, 126.141388687), (0, -1, 0)), mode=Mode.PRIVATE)
    screw_holes_chamfer_piece_6 = screw_holes_chamfer_piece_6 - Plane(origin=(136.975163208, 1.073479929, 126.141388687), x_dir=(0, 0, 1), z_dir=(0, -1, 0)) * Cylinder(1.35, 10, mode=Mode.PRIVATE)
    add(screw_holes_chamfer_piece_6)

    # Sketch4 → Cut-Loft1 section 0
    with BuildSketch(Plane(origin=(-7.640186202, 0, 125.879695971), x_dir=(0.9981631713309721, 0, 0.060582863901407005), z_dir=(-0.060582863901407005, 0, 0.9981631713309721))):
        with BuildLine():
            Line((34.465569885, 10.749979768), (39.265569885, 10.749979768))
            ThreePointArc((39.265569885, 10.749979768), (44.515569885, 5.499979768), (39.265569885, 0.249979768))
            Line((39.265569885, 0.249979768), (34.465569885, 0.249979768))
            ThreePointArc((34.465569885, 0.249979768), (29.215569885, 5.499979768), (34.465569885, 10.749979768))
        make_face()
    # Sketch3 → Cut-Loft1 section 1
    with BuildSketch(Plane(origin=(-7.337271882, 0, 120.888880114), x_dir=(0.9981631713309721, 0, 0.060582863901407005), z_dir=(-0.060582863901407005, 0, 0.9981631713309721))):
        with BuildLine():
            Line((34.465569885, 9.25), (39.265569885, 9.25))
            ThreePointArc((39.265569885, 9.25), (43.015590117, 5.499979768), (39.265569885, 1.749959536))
            Line((39.265569885, 1.749959536), (34.465569885, 1.749959536))
            ThreePointArc((34.465569885, 1.749959536), (30.715549653, 5.499979768), (34.465569885, 9.25))
        make_face()
    loft(mode=Mode.SUBTRACT)


solid = part.part
